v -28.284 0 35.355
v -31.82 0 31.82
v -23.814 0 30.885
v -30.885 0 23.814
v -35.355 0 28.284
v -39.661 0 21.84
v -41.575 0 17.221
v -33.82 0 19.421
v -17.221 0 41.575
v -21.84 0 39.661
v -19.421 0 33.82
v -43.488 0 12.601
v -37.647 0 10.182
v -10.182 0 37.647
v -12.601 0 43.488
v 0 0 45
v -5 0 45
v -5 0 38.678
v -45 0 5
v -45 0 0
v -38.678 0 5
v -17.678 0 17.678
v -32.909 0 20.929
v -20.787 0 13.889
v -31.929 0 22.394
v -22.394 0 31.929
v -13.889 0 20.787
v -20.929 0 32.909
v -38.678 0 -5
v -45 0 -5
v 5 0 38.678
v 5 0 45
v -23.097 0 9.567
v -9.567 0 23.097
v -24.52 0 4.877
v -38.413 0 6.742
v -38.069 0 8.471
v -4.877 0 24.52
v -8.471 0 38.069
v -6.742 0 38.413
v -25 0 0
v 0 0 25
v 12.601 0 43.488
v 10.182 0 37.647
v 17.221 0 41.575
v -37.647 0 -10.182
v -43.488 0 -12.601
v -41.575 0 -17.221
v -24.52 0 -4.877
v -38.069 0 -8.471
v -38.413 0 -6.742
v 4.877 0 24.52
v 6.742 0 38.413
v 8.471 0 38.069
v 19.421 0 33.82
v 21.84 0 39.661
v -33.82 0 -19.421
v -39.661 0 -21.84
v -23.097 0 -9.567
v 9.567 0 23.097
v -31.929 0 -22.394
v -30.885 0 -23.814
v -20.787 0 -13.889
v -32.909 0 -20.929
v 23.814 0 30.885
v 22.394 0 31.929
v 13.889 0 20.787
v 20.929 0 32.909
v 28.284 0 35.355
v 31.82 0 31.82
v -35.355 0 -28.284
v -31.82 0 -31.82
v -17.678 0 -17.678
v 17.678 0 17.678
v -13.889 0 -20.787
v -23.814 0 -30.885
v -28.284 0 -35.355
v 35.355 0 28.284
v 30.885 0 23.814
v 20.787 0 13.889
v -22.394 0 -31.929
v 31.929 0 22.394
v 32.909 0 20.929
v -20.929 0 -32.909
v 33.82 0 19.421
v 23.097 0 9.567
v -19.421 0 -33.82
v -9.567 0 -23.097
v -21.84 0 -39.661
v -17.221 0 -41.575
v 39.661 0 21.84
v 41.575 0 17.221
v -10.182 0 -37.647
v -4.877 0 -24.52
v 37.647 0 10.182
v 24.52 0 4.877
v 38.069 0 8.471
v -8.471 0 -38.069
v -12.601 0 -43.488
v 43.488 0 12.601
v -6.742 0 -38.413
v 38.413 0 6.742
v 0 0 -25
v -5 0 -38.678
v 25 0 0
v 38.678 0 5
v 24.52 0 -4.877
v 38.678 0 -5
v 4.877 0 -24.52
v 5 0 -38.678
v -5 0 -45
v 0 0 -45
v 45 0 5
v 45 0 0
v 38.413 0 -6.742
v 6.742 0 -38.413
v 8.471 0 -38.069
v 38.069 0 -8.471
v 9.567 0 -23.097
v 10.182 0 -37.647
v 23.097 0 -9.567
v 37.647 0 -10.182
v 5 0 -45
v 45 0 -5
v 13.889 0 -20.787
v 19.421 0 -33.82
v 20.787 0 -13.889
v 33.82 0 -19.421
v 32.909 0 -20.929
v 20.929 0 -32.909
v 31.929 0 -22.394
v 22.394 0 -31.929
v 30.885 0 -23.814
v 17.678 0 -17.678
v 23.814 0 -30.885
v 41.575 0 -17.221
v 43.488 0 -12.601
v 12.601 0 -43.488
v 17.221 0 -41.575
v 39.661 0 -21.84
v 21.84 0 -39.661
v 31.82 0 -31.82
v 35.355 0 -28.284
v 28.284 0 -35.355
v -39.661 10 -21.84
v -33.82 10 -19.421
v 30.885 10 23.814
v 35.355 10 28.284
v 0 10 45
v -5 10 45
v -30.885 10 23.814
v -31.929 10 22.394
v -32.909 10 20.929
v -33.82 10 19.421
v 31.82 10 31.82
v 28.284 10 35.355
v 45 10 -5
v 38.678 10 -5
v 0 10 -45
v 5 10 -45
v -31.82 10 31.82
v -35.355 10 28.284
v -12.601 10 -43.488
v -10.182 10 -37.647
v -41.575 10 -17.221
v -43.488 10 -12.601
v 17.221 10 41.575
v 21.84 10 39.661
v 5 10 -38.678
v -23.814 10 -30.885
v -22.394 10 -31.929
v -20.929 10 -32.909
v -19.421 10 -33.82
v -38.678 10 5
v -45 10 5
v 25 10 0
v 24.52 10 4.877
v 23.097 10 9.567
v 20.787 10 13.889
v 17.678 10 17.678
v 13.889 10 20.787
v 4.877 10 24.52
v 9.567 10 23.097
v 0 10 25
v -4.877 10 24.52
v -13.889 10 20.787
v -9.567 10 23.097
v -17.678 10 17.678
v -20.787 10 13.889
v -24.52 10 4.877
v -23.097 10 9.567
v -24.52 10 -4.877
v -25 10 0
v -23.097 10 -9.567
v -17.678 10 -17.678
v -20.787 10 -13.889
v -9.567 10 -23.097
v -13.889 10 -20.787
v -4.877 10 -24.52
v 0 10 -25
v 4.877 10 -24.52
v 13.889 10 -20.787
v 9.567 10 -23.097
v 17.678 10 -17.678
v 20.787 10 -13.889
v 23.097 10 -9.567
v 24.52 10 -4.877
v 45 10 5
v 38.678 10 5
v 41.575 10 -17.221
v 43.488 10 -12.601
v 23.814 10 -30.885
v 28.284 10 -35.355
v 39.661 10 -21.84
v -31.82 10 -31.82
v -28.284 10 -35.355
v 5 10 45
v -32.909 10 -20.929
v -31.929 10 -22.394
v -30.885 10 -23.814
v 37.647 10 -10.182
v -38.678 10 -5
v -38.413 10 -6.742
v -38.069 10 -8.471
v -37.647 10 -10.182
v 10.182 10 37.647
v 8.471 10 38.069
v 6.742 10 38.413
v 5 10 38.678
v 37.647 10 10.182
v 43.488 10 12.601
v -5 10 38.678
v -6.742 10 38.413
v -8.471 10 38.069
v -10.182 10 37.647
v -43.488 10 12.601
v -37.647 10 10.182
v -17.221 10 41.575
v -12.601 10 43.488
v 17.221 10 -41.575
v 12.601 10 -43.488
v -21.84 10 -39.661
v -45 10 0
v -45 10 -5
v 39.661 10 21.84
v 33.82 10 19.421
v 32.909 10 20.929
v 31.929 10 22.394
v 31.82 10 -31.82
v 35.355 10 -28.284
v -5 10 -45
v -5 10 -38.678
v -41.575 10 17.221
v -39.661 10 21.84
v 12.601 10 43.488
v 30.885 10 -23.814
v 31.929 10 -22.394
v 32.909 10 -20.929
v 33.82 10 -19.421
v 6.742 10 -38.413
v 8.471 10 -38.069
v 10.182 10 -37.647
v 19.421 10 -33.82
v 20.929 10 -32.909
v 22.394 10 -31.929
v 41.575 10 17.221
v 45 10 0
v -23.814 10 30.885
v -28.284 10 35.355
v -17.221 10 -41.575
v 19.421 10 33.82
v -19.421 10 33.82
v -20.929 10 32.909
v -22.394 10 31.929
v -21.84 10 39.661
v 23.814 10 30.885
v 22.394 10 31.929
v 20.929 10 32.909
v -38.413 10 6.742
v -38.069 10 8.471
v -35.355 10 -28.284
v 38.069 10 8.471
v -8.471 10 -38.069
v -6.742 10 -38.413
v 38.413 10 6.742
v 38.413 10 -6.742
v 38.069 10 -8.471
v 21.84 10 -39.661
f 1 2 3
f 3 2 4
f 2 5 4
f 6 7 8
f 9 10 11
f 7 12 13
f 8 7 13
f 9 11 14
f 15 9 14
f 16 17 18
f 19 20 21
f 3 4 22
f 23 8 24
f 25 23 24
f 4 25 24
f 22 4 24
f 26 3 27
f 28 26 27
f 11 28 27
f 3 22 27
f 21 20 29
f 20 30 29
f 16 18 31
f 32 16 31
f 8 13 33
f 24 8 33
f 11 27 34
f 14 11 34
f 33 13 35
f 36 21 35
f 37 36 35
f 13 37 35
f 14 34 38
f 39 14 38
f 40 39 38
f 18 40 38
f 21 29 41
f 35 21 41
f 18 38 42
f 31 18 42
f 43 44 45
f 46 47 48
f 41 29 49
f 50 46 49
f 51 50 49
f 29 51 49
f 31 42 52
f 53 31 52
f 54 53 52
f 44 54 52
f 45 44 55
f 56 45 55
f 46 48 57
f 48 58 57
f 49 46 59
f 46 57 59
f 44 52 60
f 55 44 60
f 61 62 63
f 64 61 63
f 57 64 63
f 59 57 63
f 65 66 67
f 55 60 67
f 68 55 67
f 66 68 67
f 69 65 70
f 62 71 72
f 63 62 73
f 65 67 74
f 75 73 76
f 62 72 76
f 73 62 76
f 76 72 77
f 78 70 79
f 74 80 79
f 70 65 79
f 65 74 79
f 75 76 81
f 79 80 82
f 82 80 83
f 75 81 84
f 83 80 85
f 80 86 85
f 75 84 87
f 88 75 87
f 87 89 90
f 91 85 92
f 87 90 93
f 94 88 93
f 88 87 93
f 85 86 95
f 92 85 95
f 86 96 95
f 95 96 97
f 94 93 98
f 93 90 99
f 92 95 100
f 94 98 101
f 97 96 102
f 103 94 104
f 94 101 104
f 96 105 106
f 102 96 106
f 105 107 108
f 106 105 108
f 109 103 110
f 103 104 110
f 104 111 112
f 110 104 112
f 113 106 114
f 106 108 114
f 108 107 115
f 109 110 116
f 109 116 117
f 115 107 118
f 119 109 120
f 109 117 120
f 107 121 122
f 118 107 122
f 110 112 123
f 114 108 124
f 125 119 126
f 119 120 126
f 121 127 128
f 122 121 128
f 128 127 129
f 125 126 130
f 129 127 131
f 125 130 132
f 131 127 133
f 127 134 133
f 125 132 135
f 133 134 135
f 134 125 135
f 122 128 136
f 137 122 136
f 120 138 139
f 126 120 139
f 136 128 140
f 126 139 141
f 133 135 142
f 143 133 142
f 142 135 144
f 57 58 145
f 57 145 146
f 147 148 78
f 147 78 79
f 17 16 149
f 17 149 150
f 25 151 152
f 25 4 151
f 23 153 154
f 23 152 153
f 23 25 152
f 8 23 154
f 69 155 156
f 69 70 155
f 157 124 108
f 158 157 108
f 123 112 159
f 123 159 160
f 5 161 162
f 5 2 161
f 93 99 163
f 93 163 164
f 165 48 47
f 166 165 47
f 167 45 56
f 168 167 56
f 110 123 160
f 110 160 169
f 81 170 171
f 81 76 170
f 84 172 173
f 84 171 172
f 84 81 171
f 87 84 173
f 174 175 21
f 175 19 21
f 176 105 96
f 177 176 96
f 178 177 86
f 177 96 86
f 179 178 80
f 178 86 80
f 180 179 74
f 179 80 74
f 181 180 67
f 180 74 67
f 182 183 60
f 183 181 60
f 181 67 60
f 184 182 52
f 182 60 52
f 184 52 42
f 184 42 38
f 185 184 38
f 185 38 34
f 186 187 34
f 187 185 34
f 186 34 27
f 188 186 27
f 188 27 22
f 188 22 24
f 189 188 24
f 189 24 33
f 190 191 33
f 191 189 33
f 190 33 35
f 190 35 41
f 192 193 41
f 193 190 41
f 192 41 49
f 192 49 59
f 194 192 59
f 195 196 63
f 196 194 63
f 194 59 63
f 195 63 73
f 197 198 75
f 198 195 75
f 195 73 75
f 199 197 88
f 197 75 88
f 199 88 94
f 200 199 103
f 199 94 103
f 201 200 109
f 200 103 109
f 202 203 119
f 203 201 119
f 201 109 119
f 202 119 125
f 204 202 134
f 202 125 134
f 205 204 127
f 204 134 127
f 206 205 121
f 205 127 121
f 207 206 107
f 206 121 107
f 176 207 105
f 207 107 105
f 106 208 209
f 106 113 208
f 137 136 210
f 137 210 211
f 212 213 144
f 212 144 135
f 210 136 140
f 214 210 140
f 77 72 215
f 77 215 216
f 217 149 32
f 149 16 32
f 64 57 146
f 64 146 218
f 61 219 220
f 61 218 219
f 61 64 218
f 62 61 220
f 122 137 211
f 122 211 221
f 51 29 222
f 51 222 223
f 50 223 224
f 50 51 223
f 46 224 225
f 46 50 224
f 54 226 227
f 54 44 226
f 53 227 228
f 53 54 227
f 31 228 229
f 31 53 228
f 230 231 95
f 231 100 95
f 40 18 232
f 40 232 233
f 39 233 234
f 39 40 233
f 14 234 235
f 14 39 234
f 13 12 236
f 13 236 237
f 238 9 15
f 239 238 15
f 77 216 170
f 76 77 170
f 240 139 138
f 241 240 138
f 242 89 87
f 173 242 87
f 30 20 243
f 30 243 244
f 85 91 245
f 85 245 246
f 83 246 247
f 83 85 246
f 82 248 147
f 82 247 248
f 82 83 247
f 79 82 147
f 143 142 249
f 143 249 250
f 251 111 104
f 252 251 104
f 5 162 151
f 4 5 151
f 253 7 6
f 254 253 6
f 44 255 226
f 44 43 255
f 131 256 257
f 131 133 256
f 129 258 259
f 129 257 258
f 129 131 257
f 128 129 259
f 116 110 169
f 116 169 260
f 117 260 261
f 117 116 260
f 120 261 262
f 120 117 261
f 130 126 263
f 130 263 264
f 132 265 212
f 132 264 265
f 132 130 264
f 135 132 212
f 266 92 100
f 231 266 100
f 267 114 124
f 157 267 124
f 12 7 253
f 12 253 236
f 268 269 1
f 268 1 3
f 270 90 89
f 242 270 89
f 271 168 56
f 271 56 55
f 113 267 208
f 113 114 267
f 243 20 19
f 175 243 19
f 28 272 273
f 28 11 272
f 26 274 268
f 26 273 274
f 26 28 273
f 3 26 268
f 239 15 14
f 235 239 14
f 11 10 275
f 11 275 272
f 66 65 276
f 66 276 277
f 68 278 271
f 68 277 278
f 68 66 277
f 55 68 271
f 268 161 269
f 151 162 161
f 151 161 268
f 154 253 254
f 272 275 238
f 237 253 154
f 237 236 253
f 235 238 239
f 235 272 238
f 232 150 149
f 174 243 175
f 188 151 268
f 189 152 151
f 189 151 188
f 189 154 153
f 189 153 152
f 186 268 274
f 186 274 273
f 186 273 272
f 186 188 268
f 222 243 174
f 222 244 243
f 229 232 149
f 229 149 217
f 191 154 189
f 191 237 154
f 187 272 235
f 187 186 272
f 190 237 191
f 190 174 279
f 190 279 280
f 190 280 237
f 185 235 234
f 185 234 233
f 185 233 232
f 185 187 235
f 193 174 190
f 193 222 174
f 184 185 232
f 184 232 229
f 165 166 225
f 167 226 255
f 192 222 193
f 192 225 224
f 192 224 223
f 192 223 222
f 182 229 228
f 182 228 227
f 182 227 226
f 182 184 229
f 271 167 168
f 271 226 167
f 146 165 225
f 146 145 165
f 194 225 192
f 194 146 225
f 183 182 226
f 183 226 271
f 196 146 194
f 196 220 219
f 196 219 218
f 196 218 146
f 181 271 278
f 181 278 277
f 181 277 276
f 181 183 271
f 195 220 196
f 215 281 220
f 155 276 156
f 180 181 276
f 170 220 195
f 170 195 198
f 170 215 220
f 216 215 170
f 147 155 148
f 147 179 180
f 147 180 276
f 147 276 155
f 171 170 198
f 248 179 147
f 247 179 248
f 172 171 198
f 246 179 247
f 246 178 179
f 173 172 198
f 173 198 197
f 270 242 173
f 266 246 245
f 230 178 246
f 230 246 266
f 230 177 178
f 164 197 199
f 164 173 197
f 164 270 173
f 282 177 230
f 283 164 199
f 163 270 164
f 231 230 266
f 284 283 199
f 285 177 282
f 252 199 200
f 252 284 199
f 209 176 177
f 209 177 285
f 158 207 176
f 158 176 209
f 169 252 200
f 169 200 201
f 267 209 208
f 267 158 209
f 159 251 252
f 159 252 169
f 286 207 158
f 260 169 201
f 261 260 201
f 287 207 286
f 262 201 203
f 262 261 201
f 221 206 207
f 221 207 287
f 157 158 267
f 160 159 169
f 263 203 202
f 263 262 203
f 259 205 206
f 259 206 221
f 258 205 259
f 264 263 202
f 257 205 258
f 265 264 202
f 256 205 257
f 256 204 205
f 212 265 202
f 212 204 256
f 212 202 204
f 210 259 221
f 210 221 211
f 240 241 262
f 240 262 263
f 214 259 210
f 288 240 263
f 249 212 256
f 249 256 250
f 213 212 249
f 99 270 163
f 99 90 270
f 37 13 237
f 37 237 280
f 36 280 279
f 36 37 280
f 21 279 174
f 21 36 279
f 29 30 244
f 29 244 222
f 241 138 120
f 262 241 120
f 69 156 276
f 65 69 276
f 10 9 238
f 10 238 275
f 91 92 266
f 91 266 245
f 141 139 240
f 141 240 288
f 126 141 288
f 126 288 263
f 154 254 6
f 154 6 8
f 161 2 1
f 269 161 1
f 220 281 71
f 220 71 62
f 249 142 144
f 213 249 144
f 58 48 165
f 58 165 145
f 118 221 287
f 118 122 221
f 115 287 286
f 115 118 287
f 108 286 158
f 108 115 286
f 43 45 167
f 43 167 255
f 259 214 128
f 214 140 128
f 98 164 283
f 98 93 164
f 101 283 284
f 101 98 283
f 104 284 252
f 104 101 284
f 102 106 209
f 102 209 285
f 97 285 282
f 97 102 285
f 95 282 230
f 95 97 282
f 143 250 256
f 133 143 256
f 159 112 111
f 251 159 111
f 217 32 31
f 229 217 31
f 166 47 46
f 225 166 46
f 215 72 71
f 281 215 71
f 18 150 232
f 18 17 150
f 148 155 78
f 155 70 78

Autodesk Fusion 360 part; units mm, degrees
sketch "Sketch1" plane through (0, 0, 0) normal (0, 1, 0) x (1, 0, 0)
  circle A0 centre (0, 0) radius 25
  line L0 (0, 0) -> (0, -50) construction
  line L1 (0, -45) -> (-5, -45)
  line L2 (-5, -45) -> (-5, -38.6782)
  line L3 (5, -45) -> (5, -38.6782)
  line L4 (0, -45) -> (5, -45)
  line L5 (12.6014, -43.488) -> (10.1821, -37.6474)
  line L6 (17.2208, -41.5746) -> (12.6014, -43.488)
  line L7 (17.2208, -41.5746) -> (21.8402, -39.6612)
  line L8 (21.8402, -39.6612) -> (19.4209, -33.8205)
  line L9 (28.2843, -35.3553) -> (23.8141, -30.8851)
  line L10 (31.8198, -31.8198) -> (28.2843, -35.3553)
  line L11 (31.8198, -31.8198) -> (35.3553, -28.2843)
  line L12 (35.3553, -28.2843) -> (30.8851, -23.8141)
  line L13 (39.6612, -21.8402) -> (33.8205, -19.4209)
  line L14 (41.5746, -17.2208) -> (39.6612, -21.8402)
  line L15 (41.5746, -17.2208) -> (43.488, -12.6014)
  line L16 (43.488, -12.6014) -> (37.6474, -10.1821)
  line L17 (45, -5) -> (38.6782, -5)
  line L18 (45, 0) -> (45, -5)
  line L19 (45, 0) -> (45, 5)
  line L20 (45, 5) -> (38.6782, 5)
  line L21 (43.488, 12.6014) -> (37.6474, 10.1821)
  line L22 (41.5746, 17.2208) -> (43.488, 12.6014)
  line L23 (41.5746, 17.2208) -> (39.6612, 21.8402)
  line L24 (39.6612, 21.8402) -> (33.8205, 19.4209)
  line L25 (35.3553, 28.2843) -> (30.8851, 23.8141)
  line L26 (31.8198, 31.8198) -> (35.3553, 28.2843)
  line L27 (31.8198, 31.8198) -> (28.2843, 35.3553)
  line L28 (28.2843, 35.3553) -> (23.8141, 30.8851)
  line L29 (21.8402, 39.6612) -> (19.4209, 33.8205)
  line L30 (17.2208, 41.5746) -> (21.8402, 39.6612)
  line L31 (17.2208, 41.5746) -> (12.6014, 43.488)
  line L32 (12.6014, 43.488) -> (10.1821, 37.6474)
  line L33 (5, 45) -> (5, 38.6782)
  line L34 (0, 45) -> (5, 45)
  line L35 (0, 45) -> (-5, 45)
  line L36 (-5, 45) -> (-5, 38.6782)
  line L37 (-12.6014, 43.488) -> (-10.1821, 37.6474)
  line L38 (-17.2208, 41.5746) -> (-12.6014, 43.488)
  line L39 (-17.2208, 41.5746) -> (-21.8402, 39.6612)
  line L40 (-21.8402, 39.6612) -> (-19.4209, 33.8205)
  line L41 (-28.2843, 35.3553) -> (-23.8141, 30.8851)
  line L42 (-31.8198, 31.8198) -> (-28.2843, 35.3553)
  line L43 (-31.8198, 31.8198) -> (-35.3553, 28.2843)
  line L44 (-35.3553, 28.2843) -> (-30.8851, 23.8141)
  line L45 (-39.6612, 21.8402) -> (-33.8205, 19.4209)
  line L46 (-41.5746, 17.2208) -> (-39.6612, 21.8402)
  line L47 (-41.5746, 17.2208) -> (-43.488, 12.6014)
  line L48 (-43.488, 12.6014) -> (-37.6474, 10.1821)
  line L49 (-45, 5) -> (-38.6782, 5)
  line L50 (-45, 0) -> (-45, 5)
  line L51 (-45, 0) -> (-45, -5)
  line L52 (-45, -5) -> (-38.6782, -5)
  line L53 (-43.488, -12.6014) -> (-37.6474, -10.1821)
  line L54 (-41.5746, -17.2208) -> (-43.488, -12.6014)
  line L55 (-41.5746, -17.2208) -> (-39.6612, -21.8402)
  line L56 (-39.6612, -21.8402) -> (-33.8205, -19.4209)
  line L57 (-35.3553, -28.2843) -> (-30.8851, -23.8141)
  line L58 (-31.8198, -31.8198) -> (-35.3553, -28.2843)
  line L59 (-31.8198, -31.8198) -> (-28.2843, -35.3553)
  line L60 (-28.2843, -35.3553) -> (-23.8141, -30.8851)
  line L61 (-21.8402, -39.6612) -> (-19.4209, -33.8205)
  line L62 (-17.2208, -41.5746) -> (-21.8402, -39.6612)
  line L63 (-17.2208, -41.5746) -> (-12.6014, -43.488)
  line L64 (-12.6014, -43.488) -> (-10.1821, -37.6474)
  arc A1 (-10.1821, -37.6474) -> (-5, -38.6782) centre (0, 0) ccw
  arc A2 (-23.8141, -30.8851) -> (-19.4209, -33.8205) centre (0, 0) ccw
  arc A3 (-33.8205, -19.4209) -> (-30.8851, -23.8141) centre (0, 0) ccw
  arc A4 (-38.6782, -5) -> (-37.6474, -10.1821) centre (0, 0) ccw
  arc A5 (-37.6474, 10.1821) -> (-38.6782, 5) centre (0, 0) ccw
  arc A6 (-30.8851, 23.8141) -> (-33.8205, 19.4209) centre (0, 0) ccw
  arc A7 (-19.4209, 33.8205) -> (-23.8141, 30.8851) centre (0, 0) ccw
  arc A8 (-5, 38.6782) -> (-10.1821, 37.6474) centre (0, 0) ccw
  arc A9 (10.1821, 37.6474) -> (5, 38.6782) centre (0, 0) ccw
  arc A10 (23.8141, 30.8851) -> (19.4209, 33.8205) centre (0, 0) ccw
  arc A11 (38.6782, 5) -> (37.6474, 10.1821) centre (0, 0) ccw
  arc A12 (33.8205, 19.4209) -> (30.8851, 23.8141) centre (0, 0) ccw
  arc A13 (37.6474, -10.1821) -> (38.6782, -5) centre (0, 0) ccw
  arc A14 (30.8851, -23.8141) -> (33.8205, -19.4209) centre (0, 0) ccw
  arc A15 (5, -38.6782) -> (10.1821, -37.6474) centre (0, 0) ccw
  arc A16 (19.4209, -33.8205) -> (23.8141, -30.8851) centre (0, 0) ccw
  dimension "d1" = 50
  dimension "d2" = 78
  dimension "d4" = 5
extrude "Extrude1" add sketch "Sketch1" along normal blind 10
